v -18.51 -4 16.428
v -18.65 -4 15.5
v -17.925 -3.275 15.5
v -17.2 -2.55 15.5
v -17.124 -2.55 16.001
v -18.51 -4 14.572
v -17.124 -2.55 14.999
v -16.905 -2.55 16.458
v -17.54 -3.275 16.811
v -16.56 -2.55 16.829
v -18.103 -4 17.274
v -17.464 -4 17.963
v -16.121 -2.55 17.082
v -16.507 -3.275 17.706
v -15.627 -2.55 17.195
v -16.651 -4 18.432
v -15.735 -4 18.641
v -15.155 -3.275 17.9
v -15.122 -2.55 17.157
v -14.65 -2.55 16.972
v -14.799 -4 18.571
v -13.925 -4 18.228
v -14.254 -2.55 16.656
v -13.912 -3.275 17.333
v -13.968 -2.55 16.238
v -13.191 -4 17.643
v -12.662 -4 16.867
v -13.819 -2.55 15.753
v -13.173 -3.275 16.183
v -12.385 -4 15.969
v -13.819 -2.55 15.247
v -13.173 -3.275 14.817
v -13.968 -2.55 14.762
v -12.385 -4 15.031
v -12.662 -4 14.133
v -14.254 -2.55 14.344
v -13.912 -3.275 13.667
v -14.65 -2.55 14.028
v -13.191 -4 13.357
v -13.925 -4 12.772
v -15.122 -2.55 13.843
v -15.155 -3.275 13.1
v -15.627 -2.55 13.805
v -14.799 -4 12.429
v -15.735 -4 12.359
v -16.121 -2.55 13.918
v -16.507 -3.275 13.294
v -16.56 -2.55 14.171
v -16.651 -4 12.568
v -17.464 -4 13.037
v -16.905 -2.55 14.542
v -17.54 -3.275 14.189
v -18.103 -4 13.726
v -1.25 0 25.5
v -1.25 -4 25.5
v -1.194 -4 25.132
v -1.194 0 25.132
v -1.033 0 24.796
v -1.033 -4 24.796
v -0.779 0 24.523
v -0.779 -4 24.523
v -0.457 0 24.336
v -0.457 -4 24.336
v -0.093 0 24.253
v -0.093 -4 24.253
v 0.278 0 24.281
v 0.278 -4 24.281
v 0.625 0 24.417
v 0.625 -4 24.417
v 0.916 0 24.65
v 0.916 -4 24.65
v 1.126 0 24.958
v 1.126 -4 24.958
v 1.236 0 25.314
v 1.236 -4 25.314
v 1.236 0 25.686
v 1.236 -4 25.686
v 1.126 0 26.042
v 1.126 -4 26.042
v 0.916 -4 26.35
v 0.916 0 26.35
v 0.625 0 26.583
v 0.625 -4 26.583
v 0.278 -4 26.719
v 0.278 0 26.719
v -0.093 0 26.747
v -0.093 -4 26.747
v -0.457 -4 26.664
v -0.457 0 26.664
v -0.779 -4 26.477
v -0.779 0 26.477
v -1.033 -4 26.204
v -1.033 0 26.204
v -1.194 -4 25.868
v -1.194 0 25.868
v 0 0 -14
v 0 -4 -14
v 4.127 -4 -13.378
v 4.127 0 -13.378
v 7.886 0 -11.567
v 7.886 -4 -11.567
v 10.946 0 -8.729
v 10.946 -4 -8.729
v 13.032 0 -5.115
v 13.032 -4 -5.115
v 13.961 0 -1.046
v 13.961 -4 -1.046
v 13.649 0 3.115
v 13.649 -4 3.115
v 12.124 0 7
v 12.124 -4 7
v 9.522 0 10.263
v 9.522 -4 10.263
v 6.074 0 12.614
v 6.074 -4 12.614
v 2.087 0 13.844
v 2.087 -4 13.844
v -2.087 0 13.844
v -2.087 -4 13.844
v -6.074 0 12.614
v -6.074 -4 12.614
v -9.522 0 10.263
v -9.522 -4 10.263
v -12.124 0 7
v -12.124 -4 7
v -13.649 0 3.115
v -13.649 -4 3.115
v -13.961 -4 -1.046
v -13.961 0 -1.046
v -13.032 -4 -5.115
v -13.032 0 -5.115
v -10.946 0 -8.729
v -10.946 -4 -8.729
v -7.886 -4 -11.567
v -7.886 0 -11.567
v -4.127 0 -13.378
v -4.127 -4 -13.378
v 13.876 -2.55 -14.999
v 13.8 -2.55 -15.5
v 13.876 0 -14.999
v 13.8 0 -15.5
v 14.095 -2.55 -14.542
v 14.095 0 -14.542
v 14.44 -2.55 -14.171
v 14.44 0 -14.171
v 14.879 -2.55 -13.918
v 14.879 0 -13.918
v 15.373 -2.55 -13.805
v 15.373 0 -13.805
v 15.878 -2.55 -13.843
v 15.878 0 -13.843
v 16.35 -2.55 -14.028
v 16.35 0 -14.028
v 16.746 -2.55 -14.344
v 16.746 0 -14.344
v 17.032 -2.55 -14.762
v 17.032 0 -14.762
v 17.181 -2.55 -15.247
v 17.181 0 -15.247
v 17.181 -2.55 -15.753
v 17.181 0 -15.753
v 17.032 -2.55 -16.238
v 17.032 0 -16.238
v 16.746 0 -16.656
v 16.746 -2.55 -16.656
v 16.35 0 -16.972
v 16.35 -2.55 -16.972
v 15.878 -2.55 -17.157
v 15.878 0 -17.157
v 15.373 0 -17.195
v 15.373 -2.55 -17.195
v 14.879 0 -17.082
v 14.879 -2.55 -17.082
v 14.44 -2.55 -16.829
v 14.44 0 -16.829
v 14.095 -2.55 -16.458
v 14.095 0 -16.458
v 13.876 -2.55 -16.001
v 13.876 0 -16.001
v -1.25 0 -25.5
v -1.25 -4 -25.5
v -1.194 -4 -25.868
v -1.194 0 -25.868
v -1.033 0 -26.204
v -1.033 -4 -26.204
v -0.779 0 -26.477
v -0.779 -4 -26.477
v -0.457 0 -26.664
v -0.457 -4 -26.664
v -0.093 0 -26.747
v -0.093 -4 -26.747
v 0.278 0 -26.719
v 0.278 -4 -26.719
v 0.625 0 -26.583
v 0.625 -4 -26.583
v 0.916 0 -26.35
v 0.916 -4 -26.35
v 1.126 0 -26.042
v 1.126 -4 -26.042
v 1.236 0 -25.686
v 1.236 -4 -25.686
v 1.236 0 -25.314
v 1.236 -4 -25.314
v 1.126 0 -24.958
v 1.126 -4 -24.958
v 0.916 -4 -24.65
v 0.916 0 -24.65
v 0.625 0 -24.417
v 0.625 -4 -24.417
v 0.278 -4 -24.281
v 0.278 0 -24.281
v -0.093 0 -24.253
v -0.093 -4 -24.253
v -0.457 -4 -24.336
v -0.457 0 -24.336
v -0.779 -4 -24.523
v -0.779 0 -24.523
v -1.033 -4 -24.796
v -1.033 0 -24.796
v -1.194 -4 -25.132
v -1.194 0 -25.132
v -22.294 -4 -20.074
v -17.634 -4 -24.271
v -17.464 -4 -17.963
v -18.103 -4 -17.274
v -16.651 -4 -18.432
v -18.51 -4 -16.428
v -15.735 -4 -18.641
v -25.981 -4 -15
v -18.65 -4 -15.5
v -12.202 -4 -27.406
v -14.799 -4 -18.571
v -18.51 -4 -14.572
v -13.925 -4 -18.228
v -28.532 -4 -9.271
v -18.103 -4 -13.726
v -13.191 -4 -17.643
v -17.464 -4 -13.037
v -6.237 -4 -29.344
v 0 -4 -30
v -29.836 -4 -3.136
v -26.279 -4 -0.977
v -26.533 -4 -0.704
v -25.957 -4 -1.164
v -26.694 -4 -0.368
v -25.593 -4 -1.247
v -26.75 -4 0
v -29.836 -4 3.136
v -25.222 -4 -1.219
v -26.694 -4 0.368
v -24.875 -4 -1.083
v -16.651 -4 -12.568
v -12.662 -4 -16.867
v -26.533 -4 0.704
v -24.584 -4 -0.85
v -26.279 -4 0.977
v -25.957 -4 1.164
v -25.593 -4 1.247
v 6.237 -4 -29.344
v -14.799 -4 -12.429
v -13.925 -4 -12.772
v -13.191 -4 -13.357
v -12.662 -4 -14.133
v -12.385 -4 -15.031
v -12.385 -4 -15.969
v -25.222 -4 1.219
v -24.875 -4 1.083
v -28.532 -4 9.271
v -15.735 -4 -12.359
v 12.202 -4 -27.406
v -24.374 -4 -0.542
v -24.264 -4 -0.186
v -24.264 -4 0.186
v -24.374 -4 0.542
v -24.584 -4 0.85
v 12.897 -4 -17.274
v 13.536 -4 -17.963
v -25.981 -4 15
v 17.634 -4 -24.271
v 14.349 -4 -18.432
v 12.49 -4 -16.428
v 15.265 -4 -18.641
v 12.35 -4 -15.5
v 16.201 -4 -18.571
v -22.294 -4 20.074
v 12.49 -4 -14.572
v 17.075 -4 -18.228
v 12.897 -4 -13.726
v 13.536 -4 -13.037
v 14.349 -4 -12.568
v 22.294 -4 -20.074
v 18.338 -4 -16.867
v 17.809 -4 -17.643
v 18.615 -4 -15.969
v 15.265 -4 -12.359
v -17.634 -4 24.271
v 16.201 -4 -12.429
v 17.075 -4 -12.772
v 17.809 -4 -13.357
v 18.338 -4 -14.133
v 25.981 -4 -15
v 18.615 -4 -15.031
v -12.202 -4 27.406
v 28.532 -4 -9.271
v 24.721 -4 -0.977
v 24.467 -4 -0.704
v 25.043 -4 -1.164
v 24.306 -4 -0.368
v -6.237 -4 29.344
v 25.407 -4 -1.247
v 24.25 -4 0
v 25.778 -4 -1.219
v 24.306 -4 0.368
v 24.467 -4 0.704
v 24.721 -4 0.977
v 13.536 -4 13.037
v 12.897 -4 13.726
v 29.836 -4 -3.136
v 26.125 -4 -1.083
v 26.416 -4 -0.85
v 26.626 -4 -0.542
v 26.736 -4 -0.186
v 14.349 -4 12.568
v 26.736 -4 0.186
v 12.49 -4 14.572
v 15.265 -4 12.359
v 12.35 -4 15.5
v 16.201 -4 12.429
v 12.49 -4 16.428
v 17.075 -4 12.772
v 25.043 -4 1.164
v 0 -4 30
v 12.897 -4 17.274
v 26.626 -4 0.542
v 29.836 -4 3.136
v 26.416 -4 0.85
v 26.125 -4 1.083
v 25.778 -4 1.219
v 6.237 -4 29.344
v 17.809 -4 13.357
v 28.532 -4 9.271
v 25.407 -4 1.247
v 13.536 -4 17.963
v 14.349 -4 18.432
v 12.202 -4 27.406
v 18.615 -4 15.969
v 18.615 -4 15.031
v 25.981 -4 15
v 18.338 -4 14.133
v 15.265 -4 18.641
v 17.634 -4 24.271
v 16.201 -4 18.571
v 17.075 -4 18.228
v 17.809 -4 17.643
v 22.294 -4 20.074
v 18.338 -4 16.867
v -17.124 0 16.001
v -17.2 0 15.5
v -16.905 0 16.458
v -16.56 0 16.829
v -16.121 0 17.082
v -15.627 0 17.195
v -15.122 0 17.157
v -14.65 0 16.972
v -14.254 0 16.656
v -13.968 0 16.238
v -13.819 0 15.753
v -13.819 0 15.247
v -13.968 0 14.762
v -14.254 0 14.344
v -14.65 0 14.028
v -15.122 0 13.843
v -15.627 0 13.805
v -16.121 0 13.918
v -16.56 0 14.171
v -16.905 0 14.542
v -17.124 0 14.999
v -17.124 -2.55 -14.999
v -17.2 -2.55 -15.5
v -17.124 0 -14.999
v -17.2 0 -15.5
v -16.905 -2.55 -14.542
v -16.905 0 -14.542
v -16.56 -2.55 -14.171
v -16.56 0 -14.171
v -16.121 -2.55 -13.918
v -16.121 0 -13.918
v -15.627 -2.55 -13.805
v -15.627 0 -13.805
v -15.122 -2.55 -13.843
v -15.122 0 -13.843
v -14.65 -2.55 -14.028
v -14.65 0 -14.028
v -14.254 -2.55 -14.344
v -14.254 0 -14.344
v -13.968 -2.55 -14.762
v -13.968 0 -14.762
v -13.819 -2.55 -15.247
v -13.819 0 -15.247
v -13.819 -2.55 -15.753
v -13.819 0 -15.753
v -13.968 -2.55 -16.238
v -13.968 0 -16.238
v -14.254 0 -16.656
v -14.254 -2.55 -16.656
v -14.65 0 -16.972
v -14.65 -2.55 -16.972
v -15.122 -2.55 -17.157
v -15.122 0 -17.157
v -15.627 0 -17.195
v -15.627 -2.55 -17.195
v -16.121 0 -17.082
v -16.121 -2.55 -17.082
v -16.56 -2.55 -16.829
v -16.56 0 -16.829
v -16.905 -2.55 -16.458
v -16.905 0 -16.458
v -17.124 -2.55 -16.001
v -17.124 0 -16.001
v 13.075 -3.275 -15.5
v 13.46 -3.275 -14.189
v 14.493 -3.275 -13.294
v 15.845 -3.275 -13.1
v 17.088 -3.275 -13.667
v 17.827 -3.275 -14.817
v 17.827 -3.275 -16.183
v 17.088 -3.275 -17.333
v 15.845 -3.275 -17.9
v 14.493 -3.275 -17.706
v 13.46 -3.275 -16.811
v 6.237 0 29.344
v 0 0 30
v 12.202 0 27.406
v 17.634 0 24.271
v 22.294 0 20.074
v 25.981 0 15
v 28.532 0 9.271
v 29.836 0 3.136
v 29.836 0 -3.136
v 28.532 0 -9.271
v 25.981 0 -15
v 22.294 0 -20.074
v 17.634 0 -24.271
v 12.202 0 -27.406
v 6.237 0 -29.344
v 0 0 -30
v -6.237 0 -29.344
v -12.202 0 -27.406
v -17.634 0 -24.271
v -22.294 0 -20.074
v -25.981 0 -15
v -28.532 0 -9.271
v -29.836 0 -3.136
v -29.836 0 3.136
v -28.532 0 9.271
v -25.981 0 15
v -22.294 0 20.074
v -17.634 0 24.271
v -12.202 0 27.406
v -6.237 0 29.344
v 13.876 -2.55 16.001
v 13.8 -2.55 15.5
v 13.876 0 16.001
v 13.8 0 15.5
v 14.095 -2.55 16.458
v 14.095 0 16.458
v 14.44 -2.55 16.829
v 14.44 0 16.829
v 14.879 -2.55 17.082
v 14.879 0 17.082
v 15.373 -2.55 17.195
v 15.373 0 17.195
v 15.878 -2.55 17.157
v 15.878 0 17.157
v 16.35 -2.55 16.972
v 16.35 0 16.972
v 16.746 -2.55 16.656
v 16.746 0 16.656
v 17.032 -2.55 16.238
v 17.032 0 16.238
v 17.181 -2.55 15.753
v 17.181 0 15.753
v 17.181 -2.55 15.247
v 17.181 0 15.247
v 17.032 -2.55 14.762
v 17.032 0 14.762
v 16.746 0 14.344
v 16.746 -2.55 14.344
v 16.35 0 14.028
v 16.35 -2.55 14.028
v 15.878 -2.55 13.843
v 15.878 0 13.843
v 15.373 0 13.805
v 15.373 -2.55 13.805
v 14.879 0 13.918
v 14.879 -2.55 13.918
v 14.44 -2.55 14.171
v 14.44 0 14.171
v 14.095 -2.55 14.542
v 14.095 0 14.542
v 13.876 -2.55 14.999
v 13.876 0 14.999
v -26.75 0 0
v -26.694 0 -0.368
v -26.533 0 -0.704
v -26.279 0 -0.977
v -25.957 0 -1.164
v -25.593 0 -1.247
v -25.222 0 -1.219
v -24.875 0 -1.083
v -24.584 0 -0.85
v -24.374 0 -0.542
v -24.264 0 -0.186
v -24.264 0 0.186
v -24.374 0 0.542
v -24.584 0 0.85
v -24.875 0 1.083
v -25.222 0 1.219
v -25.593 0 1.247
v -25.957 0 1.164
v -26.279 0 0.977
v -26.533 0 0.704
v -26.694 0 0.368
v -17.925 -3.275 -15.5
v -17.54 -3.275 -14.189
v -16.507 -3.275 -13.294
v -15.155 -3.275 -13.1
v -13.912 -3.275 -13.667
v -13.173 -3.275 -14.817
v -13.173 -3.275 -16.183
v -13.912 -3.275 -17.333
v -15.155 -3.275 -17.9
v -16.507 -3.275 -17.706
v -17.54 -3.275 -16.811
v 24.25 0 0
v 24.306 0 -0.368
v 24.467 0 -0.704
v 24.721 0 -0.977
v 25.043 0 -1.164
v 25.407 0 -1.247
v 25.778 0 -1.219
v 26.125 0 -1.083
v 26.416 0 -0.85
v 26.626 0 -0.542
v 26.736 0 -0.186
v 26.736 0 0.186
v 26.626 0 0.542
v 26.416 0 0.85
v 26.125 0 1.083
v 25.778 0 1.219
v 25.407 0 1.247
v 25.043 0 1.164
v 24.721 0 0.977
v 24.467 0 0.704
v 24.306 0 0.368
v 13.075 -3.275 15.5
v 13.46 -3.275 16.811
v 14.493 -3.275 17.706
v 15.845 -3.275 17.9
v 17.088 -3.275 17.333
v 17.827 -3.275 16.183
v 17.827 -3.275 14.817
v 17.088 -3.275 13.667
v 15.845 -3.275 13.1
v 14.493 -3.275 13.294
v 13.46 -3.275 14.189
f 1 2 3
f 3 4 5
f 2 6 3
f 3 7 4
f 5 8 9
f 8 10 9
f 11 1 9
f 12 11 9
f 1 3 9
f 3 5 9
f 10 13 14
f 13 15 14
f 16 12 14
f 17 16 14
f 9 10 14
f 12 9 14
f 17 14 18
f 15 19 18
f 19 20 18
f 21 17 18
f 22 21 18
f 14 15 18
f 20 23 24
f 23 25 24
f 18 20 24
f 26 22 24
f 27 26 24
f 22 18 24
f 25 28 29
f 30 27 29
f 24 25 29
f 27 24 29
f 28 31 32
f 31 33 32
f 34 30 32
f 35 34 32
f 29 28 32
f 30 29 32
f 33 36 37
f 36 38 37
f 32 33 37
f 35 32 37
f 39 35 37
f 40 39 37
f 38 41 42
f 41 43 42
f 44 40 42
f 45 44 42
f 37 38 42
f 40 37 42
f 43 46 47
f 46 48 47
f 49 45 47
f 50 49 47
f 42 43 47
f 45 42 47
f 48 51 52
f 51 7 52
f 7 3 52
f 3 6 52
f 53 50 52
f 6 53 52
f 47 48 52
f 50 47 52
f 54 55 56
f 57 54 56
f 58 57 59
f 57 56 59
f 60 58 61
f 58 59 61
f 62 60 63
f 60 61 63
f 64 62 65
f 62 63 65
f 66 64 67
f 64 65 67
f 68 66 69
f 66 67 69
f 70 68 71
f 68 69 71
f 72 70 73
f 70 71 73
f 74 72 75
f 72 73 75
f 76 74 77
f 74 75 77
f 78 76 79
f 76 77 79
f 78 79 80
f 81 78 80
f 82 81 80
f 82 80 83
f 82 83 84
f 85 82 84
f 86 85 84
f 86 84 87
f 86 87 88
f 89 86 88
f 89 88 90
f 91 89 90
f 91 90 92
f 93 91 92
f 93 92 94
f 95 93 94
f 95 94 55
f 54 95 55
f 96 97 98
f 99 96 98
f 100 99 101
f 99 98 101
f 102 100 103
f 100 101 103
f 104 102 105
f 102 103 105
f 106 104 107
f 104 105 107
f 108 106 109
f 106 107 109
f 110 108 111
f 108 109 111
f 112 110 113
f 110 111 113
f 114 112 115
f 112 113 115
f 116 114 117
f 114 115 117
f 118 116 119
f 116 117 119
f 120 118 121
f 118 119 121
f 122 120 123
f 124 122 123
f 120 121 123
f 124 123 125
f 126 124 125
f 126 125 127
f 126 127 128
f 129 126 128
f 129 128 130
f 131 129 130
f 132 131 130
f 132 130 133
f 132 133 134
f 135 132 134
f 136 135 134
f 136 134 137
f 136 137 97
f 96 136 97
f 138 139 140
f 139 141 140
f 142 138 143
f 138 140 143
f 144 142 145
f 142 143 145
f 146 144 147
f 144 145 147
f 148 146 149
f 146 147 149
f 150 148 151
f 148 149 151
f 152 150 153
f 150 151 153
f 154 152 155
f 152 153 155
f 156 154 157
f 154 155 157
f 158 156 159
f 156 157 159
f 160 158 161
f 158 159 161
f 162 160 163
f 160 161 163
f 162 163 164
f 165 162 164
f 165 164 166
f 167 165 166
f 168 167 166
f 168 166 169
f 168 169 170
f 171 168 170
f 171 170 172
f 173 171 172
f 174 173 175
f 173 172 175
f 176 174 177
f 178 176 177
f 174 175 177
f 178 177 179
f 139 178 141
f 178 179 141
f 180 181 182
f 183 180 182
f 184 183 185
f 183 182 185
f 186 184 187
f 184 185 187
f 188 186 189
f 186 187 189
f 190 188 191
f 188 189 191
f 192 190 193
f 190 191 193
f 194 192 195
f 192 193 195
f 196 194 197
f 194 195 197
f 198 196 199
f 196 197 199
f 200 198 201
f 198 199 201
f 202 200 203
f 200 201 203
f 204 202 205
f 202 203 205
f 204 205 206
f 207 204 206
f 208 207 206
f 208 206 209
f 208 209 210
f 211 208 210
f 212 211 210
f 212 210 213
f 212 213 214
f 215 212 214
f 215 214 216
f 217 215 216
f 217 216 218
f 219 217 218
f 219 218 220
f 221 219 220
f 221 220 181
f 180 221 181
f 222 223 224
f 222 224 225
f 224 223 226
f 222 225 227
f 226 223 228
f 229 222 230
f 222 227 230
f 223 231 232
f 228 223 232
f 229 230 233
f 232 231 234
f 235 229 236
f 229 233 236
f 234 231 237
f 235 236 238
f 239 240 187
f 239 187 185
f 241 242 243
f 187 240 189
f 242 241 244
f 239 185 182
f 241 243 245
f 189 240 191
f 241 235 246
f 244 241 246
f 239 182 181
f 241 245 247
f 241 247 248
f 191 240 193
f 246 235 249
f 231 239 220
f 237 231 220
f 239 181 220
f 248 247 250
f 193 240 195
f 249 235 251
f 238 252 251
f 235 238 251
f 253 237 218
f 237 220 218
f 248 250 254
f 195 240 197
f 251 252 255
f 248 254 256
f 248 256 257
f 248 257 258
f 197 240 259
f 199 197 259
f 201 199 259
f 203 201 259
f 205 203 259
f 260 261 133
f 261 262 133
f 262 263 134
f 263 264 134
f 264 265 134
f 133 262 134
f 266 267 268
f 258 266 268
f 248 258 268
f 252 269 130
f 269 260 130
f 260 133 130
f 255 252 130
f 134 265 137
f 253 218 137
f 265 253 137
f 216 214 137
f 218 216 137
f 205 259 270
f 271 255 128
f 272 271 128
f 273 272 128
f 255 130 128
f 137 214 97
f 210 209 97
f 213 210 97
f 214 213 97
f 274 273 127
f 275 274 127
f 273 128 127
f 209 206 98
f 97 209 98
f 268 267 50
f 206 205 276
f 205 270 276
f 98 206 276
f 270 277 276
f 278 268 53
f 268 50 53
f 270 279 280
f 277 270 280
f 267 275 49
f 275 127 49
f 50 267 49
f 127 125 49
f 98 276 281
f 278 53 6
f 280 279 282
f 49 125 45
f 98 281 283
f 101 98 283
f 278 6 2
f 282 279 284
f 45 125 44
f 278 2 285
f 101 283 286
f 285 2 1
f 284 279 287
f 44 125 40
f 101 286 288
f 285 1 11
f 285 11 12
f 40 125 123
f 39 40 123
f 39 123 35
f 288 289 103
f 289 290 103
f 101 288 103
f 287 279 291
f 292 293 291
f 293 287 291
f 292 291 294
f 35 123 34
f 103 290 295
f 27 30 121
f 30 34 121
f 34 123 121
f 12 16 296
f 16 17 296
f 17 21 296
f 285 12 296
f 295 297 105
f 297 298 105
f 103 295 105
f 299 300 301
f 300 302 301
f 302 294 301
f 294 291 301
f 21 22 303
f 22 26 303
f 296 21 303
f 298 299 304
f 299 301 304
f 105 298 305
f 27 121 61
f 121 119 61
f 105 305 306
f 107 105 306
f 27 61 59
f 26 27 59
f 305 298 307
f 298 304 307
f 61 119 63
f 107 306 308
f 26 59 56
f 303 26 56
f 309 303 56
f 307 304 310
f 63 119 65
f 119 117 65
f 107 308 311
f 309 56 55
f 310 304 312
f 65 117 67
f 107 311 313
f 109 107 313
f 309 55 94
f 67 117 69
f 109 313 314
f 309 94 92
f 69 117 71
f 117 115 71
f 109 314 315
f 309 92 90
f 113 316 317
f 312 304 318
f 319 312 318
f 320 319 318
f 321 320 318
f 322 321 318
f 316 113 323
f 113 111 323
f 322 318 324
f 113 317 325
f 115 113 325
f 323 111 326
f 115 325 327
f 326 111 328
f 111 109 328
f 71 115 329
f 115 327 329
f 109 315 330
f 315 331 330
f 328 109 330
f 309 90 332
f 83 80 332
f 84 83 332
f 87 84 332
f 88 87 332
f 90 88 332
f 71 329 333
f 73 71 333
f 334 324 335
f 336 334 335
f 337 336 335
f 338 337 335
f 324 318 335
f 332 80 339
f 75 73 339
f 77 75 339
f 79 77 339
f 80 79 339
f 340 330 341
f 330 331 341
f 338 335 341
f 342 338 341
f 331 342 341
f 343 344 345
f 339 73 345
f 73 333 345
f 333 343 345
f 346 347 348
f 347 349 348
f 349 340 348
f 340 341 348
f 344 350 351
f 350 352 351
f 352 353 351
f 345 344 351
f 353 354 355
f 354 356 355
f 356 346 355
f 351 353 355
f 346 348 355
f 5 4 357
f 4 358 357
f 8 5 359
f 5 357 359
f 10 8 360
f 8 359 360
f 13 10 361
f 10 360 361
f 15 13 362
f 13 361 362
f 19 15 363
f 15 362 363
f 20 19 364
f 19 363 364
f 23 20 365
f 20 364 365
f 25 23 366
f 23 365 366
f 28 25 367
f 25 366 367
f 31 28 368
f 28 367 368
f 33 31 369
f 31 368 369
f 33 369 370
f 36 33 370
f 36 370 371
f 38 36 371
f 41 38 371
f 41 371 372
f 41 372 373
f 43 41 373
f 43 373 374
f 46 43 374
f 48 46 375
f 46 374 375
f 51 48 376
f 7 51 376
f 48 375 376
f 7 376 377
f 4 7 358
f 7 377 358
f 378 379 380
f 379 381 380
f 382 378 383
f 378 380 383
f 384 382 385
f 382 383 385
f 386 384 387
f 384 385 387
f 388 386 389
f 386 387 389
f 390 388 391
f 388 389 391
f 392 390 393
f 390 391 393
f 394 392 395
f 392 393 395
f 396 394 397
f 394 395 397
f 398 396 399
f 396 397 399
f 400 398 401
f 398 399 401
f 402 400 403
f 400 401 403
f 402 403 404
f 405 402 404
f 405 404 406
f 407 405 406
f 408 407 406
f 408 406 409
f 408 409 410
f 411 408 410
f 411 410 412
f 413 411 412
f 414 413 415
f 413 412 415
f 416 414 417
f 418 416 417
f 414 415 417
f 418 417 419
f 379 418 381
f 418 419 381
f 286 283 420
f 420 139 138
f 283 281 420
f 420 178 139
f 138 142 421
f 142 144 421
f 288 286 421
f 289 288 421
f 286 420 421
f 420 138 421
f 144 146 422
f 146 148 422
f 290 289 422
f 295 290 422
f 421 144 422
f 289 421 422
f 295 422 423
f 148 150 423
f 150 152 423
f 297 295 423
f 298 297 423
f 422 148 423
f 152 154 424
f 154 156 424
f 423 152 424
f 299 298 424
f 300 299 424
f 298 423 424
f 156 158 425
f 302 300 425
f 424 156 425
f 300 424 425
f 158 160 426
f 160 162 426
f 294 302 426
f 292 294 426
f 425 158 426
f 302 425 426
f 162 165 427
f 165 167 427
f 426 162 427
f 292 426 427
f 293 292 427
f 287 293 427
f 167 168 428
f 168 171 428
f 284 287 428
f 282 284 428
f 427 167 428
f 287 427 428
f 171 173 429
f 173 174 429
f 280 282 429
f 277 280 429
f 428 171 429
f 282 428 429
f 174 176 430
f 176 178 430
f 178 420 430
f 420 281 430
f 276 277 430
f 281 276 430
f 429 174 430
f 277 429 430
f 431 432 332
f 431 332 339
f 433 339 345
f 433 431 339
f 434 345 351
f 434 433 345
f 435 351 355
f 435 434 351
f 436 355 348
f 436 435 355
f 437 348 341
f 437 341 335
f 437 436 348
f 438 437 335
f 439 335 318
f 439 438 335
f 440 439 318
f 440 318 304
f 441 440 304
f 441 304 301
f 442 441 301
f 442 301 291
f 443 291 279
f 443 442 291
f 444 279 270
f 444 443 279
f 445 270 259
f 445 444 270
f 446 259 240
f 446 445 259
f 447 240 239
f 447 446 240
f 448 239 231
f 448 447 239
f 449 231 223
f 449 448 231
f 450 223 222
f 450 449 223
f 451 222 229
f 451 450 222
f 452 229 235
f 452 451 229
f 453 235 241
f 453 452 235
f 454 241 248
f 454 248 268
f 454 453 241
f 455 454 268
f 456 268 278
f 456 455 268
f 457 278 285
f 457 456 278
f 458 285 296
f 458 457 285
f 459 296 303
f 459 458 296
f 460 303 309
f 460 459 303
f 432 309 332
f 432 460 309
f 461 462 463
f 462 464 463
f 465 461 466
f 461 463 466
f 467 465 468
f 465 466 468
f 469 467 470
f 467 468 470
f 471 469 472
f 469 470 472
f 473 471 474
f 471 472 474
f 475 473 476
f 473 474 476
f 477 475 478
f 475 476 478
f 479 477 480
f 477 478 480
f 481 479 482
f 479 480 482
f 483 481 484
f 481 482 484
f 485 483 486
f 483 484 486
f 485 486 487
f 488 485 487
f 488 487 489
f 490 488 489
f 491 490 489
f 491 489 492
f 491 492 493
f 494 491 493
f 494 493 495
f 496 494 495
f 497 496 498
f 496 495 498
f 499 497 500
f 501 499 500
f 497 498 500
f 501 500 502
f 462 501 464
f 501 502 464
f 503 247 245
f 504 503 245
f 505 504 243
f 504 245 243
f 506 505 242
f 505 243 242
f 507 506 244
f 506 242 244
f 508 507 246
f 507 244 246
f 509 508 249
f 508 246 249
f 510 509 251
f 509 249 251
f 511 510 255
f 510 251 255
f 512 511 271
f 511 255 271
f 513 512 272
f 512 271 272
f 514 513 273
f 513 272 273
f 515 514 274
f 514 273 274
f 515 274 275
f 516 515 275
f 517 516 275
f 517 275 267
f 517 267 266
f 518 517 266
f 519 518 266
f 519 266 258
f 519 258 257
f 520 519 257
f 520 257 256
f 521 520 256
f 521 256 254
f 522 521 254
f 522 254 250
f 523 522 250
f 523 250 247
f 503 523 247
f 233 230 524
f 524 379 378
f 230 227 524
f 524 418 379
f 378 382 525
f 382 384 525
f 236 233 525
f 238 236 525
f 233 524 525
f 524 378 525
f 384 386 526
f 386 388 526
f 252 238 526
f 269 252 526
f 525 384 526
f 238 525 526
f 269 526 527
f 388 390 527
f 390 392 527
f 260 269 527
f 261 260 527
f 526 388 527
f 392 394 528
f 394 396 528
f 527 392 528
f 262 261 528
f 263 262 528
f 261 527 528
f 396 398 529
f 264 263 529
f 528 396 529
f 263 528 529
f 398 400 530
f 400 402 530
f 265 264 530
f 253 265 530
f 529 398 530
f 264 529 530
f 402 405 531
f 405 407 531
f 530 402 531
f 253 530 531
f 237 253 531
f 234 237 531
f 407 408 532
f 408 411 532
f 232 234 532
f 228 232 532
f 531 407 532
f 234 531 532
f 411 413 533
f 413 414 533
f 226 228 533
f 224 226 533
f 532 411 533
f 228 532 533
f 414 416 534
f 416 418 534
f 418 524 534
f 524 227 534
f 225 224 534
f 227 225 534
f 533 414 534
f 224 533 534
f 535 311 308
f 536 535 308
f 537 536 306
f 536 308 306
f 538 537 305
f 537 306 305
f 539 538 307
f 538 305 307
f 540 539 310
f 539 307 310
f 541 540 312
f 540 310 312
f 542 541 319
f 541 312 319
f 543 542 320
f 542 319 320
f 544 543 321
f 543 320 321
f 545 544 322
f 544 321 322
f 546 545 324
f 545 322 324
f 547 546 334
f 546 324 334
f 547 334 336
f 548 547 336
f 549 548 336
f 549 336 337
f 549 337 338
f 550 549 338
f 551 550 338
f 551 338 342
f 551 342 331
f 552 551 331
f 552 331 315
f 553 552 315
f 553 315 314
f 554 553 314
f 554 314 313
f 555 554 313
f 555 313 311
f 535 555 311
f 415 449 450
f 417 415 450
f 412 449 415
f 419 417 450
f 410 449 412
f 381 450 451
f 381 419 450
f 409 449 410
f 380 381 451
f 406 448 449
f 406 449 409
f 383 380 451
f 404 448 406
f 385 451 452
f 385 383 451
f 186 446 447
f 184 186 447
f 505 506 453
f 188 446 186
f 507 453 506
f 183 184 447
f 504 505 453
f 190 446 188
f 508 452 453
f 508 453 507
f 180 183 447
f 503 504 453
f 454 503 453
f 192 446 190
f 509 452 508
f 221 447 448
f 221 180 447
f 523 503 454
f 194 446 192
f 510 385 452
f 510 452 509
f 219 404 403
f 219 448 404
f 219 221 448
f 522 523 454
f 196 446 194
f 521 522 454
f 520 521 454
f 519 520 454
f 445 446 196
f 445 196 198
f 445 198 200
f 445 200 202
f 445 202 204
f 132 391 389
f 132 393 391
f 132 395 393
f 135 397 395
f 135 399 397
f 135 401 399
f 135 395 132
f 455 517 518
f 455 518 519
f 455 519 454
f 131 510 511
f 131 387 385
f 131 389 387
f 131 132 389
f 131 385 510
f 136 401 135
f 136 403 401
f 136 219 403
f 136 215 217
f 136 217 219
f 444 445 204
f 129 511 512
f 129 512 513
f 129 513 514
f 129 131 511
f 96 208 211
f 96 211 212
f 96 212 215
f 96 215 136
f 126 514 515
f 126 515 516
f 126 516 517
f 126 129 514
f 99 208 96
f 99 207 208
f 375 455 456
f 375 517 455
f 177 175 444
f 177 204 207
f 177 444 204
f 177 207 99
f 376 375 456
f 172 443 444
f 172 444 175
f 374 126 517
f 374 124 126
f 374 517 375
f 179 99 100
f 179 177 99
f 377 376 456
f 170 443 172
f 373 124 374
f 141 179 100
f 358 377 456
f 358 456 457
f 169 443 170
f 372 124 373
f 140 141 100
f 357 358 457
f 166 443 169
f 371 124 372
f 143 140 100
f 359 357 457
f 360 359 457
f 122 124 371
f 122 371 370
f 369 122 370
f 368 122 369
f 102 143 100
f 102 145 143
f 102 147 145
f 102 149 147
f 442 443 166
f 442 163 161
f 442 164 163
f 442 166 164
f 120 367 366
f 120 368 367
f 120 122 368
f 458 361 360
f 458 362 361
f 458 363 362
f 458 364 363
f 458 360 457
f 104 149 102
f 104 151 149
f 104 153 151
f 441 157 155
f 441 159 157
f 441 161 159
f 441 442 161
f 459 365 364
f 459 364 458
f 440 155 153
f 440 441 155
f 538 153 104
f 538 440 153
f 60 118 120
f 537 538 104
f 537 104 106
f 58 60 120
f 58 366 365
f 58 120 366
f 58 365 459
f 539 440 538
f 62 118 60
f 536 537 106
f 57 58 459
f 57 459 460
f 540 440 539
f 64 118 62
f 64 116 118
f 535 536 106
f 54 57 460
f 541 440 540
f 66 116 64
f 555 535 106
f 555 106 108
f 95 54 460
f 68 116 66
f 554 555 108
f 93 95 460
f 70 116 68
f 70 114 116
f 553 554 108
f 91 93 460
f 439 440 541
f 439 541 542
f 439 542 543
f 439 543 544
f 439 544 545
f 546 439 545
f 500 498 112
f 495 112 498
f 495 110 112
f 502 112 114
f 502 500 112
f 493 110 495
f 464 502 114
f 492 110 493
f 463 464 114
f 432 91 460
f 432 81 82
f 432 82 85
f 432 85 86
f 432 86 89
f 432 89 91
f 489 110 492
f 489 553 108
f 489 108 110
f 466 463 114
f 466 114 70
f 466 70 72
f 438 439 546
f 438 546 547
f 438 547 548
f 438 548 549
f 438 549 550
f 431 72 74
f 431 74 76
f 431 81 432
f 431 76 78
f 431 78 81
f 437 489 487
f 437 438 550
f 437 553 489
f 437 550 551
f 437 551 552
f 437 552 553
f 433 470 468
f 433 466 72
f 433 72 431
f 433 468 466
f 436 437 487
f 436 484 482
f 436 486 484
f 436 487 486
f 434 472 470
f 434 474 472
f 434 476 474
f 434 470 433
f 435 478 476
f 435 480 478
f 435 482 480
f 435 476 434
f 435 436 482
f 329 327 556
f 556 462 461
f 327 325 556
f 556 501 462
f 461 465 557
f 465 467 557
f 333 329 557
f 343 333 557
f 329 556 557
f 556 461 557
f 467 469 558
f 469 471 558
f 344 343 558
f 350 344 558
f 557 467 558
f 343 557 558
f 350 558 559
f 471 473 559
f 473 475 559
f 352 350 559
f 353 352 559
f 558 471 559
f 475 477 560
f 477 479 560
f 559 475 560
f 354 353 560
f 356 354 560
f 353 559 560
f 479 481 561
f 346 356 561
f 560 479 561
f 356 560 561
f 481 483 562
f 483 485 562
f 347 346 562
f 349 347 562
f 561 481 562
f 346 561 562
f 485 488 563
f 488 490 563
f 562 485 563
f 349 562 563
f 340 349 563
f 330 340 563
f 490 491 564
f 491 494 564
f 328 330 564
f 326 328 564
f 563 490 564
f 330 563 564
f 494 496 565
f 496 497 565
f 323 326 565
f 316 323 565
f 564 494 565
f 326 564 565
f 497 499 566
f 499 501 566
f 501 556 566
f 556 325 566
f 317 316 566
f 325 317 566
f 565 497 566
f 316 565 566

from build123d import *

# Parameters (mm, degrees)
SKETCH1_R                   = 30
BASE_FLANGE1_DEPTH          = 4
M3_TAPPED_BASE_D            = 2.5
M3_TAPPED_MOTOR_D           = 3.4
M3_TAPPED_MOTOR_CSINK_D     = 6.3
M3_TAPPED_MOTOR_CSINK_ANGLE = 90
SKETCH10_R                  = 14
CUT_EXTRUDE1_DEPTH          = 43.614551505


# Sheet-metal steps are written as plain solids
with BuildPart() as part:
    # Sketch1 → Base-Flange1 (new body)
    with BuildSketch(Plane(origin=(0, 0, 0), x_dir=(1, 0, 0), z_dir=(0, 1, 0))):
        with Locations(Location((0, 0, 0), (0, 0, 270))):
            Circle(SKETCH1_R)
    extrude(amount=-BASE_FLANGE1_DEPTH)

    # M3 Tapped base (through all)
    with Locations(Plane(origin=(0, 0, 0), x_dir=(1, 0, 0), z_dir=(0, 1, 0))):
        with Locations((0, 25.5), (25.5, 0), (0, -25.5), (-25.5, 0)):
            Hole(M3_TAPPED_BASE_D / 2)

    # M3 Tapped motor (through all)
    with Locations(Plane.XZ.offset(4)):
        with Locations((-15.5, -15.5), (15.5, 15.5), (-15.5, 15.5), (15.5, -15.5)):
            CounterSinkHole(M3_TAPPED_MOTOR_D / 2, M3_TAPPED_MOTOR_CSINK_D / 2, counter_sink_angle=M3_TAPPED_MOTOR_CSINK_ANGLE)

    # Sketch10 → Cut-Extrude1 (cut, through all)
    with BuildSketch(Plane(origin=(0, -4, 0), x_dir=(-1, 0, 0), z_dir=(0, -1, 0))):
        with Locations(Location((0, 0, 0), (0, 0, 90))):
            Circle(SKETCH10_R)
    extrude(amount=-CUT_EXTRUDE1_DEPTH, mode=Mode.SUBTRACT)


solid = part.part
